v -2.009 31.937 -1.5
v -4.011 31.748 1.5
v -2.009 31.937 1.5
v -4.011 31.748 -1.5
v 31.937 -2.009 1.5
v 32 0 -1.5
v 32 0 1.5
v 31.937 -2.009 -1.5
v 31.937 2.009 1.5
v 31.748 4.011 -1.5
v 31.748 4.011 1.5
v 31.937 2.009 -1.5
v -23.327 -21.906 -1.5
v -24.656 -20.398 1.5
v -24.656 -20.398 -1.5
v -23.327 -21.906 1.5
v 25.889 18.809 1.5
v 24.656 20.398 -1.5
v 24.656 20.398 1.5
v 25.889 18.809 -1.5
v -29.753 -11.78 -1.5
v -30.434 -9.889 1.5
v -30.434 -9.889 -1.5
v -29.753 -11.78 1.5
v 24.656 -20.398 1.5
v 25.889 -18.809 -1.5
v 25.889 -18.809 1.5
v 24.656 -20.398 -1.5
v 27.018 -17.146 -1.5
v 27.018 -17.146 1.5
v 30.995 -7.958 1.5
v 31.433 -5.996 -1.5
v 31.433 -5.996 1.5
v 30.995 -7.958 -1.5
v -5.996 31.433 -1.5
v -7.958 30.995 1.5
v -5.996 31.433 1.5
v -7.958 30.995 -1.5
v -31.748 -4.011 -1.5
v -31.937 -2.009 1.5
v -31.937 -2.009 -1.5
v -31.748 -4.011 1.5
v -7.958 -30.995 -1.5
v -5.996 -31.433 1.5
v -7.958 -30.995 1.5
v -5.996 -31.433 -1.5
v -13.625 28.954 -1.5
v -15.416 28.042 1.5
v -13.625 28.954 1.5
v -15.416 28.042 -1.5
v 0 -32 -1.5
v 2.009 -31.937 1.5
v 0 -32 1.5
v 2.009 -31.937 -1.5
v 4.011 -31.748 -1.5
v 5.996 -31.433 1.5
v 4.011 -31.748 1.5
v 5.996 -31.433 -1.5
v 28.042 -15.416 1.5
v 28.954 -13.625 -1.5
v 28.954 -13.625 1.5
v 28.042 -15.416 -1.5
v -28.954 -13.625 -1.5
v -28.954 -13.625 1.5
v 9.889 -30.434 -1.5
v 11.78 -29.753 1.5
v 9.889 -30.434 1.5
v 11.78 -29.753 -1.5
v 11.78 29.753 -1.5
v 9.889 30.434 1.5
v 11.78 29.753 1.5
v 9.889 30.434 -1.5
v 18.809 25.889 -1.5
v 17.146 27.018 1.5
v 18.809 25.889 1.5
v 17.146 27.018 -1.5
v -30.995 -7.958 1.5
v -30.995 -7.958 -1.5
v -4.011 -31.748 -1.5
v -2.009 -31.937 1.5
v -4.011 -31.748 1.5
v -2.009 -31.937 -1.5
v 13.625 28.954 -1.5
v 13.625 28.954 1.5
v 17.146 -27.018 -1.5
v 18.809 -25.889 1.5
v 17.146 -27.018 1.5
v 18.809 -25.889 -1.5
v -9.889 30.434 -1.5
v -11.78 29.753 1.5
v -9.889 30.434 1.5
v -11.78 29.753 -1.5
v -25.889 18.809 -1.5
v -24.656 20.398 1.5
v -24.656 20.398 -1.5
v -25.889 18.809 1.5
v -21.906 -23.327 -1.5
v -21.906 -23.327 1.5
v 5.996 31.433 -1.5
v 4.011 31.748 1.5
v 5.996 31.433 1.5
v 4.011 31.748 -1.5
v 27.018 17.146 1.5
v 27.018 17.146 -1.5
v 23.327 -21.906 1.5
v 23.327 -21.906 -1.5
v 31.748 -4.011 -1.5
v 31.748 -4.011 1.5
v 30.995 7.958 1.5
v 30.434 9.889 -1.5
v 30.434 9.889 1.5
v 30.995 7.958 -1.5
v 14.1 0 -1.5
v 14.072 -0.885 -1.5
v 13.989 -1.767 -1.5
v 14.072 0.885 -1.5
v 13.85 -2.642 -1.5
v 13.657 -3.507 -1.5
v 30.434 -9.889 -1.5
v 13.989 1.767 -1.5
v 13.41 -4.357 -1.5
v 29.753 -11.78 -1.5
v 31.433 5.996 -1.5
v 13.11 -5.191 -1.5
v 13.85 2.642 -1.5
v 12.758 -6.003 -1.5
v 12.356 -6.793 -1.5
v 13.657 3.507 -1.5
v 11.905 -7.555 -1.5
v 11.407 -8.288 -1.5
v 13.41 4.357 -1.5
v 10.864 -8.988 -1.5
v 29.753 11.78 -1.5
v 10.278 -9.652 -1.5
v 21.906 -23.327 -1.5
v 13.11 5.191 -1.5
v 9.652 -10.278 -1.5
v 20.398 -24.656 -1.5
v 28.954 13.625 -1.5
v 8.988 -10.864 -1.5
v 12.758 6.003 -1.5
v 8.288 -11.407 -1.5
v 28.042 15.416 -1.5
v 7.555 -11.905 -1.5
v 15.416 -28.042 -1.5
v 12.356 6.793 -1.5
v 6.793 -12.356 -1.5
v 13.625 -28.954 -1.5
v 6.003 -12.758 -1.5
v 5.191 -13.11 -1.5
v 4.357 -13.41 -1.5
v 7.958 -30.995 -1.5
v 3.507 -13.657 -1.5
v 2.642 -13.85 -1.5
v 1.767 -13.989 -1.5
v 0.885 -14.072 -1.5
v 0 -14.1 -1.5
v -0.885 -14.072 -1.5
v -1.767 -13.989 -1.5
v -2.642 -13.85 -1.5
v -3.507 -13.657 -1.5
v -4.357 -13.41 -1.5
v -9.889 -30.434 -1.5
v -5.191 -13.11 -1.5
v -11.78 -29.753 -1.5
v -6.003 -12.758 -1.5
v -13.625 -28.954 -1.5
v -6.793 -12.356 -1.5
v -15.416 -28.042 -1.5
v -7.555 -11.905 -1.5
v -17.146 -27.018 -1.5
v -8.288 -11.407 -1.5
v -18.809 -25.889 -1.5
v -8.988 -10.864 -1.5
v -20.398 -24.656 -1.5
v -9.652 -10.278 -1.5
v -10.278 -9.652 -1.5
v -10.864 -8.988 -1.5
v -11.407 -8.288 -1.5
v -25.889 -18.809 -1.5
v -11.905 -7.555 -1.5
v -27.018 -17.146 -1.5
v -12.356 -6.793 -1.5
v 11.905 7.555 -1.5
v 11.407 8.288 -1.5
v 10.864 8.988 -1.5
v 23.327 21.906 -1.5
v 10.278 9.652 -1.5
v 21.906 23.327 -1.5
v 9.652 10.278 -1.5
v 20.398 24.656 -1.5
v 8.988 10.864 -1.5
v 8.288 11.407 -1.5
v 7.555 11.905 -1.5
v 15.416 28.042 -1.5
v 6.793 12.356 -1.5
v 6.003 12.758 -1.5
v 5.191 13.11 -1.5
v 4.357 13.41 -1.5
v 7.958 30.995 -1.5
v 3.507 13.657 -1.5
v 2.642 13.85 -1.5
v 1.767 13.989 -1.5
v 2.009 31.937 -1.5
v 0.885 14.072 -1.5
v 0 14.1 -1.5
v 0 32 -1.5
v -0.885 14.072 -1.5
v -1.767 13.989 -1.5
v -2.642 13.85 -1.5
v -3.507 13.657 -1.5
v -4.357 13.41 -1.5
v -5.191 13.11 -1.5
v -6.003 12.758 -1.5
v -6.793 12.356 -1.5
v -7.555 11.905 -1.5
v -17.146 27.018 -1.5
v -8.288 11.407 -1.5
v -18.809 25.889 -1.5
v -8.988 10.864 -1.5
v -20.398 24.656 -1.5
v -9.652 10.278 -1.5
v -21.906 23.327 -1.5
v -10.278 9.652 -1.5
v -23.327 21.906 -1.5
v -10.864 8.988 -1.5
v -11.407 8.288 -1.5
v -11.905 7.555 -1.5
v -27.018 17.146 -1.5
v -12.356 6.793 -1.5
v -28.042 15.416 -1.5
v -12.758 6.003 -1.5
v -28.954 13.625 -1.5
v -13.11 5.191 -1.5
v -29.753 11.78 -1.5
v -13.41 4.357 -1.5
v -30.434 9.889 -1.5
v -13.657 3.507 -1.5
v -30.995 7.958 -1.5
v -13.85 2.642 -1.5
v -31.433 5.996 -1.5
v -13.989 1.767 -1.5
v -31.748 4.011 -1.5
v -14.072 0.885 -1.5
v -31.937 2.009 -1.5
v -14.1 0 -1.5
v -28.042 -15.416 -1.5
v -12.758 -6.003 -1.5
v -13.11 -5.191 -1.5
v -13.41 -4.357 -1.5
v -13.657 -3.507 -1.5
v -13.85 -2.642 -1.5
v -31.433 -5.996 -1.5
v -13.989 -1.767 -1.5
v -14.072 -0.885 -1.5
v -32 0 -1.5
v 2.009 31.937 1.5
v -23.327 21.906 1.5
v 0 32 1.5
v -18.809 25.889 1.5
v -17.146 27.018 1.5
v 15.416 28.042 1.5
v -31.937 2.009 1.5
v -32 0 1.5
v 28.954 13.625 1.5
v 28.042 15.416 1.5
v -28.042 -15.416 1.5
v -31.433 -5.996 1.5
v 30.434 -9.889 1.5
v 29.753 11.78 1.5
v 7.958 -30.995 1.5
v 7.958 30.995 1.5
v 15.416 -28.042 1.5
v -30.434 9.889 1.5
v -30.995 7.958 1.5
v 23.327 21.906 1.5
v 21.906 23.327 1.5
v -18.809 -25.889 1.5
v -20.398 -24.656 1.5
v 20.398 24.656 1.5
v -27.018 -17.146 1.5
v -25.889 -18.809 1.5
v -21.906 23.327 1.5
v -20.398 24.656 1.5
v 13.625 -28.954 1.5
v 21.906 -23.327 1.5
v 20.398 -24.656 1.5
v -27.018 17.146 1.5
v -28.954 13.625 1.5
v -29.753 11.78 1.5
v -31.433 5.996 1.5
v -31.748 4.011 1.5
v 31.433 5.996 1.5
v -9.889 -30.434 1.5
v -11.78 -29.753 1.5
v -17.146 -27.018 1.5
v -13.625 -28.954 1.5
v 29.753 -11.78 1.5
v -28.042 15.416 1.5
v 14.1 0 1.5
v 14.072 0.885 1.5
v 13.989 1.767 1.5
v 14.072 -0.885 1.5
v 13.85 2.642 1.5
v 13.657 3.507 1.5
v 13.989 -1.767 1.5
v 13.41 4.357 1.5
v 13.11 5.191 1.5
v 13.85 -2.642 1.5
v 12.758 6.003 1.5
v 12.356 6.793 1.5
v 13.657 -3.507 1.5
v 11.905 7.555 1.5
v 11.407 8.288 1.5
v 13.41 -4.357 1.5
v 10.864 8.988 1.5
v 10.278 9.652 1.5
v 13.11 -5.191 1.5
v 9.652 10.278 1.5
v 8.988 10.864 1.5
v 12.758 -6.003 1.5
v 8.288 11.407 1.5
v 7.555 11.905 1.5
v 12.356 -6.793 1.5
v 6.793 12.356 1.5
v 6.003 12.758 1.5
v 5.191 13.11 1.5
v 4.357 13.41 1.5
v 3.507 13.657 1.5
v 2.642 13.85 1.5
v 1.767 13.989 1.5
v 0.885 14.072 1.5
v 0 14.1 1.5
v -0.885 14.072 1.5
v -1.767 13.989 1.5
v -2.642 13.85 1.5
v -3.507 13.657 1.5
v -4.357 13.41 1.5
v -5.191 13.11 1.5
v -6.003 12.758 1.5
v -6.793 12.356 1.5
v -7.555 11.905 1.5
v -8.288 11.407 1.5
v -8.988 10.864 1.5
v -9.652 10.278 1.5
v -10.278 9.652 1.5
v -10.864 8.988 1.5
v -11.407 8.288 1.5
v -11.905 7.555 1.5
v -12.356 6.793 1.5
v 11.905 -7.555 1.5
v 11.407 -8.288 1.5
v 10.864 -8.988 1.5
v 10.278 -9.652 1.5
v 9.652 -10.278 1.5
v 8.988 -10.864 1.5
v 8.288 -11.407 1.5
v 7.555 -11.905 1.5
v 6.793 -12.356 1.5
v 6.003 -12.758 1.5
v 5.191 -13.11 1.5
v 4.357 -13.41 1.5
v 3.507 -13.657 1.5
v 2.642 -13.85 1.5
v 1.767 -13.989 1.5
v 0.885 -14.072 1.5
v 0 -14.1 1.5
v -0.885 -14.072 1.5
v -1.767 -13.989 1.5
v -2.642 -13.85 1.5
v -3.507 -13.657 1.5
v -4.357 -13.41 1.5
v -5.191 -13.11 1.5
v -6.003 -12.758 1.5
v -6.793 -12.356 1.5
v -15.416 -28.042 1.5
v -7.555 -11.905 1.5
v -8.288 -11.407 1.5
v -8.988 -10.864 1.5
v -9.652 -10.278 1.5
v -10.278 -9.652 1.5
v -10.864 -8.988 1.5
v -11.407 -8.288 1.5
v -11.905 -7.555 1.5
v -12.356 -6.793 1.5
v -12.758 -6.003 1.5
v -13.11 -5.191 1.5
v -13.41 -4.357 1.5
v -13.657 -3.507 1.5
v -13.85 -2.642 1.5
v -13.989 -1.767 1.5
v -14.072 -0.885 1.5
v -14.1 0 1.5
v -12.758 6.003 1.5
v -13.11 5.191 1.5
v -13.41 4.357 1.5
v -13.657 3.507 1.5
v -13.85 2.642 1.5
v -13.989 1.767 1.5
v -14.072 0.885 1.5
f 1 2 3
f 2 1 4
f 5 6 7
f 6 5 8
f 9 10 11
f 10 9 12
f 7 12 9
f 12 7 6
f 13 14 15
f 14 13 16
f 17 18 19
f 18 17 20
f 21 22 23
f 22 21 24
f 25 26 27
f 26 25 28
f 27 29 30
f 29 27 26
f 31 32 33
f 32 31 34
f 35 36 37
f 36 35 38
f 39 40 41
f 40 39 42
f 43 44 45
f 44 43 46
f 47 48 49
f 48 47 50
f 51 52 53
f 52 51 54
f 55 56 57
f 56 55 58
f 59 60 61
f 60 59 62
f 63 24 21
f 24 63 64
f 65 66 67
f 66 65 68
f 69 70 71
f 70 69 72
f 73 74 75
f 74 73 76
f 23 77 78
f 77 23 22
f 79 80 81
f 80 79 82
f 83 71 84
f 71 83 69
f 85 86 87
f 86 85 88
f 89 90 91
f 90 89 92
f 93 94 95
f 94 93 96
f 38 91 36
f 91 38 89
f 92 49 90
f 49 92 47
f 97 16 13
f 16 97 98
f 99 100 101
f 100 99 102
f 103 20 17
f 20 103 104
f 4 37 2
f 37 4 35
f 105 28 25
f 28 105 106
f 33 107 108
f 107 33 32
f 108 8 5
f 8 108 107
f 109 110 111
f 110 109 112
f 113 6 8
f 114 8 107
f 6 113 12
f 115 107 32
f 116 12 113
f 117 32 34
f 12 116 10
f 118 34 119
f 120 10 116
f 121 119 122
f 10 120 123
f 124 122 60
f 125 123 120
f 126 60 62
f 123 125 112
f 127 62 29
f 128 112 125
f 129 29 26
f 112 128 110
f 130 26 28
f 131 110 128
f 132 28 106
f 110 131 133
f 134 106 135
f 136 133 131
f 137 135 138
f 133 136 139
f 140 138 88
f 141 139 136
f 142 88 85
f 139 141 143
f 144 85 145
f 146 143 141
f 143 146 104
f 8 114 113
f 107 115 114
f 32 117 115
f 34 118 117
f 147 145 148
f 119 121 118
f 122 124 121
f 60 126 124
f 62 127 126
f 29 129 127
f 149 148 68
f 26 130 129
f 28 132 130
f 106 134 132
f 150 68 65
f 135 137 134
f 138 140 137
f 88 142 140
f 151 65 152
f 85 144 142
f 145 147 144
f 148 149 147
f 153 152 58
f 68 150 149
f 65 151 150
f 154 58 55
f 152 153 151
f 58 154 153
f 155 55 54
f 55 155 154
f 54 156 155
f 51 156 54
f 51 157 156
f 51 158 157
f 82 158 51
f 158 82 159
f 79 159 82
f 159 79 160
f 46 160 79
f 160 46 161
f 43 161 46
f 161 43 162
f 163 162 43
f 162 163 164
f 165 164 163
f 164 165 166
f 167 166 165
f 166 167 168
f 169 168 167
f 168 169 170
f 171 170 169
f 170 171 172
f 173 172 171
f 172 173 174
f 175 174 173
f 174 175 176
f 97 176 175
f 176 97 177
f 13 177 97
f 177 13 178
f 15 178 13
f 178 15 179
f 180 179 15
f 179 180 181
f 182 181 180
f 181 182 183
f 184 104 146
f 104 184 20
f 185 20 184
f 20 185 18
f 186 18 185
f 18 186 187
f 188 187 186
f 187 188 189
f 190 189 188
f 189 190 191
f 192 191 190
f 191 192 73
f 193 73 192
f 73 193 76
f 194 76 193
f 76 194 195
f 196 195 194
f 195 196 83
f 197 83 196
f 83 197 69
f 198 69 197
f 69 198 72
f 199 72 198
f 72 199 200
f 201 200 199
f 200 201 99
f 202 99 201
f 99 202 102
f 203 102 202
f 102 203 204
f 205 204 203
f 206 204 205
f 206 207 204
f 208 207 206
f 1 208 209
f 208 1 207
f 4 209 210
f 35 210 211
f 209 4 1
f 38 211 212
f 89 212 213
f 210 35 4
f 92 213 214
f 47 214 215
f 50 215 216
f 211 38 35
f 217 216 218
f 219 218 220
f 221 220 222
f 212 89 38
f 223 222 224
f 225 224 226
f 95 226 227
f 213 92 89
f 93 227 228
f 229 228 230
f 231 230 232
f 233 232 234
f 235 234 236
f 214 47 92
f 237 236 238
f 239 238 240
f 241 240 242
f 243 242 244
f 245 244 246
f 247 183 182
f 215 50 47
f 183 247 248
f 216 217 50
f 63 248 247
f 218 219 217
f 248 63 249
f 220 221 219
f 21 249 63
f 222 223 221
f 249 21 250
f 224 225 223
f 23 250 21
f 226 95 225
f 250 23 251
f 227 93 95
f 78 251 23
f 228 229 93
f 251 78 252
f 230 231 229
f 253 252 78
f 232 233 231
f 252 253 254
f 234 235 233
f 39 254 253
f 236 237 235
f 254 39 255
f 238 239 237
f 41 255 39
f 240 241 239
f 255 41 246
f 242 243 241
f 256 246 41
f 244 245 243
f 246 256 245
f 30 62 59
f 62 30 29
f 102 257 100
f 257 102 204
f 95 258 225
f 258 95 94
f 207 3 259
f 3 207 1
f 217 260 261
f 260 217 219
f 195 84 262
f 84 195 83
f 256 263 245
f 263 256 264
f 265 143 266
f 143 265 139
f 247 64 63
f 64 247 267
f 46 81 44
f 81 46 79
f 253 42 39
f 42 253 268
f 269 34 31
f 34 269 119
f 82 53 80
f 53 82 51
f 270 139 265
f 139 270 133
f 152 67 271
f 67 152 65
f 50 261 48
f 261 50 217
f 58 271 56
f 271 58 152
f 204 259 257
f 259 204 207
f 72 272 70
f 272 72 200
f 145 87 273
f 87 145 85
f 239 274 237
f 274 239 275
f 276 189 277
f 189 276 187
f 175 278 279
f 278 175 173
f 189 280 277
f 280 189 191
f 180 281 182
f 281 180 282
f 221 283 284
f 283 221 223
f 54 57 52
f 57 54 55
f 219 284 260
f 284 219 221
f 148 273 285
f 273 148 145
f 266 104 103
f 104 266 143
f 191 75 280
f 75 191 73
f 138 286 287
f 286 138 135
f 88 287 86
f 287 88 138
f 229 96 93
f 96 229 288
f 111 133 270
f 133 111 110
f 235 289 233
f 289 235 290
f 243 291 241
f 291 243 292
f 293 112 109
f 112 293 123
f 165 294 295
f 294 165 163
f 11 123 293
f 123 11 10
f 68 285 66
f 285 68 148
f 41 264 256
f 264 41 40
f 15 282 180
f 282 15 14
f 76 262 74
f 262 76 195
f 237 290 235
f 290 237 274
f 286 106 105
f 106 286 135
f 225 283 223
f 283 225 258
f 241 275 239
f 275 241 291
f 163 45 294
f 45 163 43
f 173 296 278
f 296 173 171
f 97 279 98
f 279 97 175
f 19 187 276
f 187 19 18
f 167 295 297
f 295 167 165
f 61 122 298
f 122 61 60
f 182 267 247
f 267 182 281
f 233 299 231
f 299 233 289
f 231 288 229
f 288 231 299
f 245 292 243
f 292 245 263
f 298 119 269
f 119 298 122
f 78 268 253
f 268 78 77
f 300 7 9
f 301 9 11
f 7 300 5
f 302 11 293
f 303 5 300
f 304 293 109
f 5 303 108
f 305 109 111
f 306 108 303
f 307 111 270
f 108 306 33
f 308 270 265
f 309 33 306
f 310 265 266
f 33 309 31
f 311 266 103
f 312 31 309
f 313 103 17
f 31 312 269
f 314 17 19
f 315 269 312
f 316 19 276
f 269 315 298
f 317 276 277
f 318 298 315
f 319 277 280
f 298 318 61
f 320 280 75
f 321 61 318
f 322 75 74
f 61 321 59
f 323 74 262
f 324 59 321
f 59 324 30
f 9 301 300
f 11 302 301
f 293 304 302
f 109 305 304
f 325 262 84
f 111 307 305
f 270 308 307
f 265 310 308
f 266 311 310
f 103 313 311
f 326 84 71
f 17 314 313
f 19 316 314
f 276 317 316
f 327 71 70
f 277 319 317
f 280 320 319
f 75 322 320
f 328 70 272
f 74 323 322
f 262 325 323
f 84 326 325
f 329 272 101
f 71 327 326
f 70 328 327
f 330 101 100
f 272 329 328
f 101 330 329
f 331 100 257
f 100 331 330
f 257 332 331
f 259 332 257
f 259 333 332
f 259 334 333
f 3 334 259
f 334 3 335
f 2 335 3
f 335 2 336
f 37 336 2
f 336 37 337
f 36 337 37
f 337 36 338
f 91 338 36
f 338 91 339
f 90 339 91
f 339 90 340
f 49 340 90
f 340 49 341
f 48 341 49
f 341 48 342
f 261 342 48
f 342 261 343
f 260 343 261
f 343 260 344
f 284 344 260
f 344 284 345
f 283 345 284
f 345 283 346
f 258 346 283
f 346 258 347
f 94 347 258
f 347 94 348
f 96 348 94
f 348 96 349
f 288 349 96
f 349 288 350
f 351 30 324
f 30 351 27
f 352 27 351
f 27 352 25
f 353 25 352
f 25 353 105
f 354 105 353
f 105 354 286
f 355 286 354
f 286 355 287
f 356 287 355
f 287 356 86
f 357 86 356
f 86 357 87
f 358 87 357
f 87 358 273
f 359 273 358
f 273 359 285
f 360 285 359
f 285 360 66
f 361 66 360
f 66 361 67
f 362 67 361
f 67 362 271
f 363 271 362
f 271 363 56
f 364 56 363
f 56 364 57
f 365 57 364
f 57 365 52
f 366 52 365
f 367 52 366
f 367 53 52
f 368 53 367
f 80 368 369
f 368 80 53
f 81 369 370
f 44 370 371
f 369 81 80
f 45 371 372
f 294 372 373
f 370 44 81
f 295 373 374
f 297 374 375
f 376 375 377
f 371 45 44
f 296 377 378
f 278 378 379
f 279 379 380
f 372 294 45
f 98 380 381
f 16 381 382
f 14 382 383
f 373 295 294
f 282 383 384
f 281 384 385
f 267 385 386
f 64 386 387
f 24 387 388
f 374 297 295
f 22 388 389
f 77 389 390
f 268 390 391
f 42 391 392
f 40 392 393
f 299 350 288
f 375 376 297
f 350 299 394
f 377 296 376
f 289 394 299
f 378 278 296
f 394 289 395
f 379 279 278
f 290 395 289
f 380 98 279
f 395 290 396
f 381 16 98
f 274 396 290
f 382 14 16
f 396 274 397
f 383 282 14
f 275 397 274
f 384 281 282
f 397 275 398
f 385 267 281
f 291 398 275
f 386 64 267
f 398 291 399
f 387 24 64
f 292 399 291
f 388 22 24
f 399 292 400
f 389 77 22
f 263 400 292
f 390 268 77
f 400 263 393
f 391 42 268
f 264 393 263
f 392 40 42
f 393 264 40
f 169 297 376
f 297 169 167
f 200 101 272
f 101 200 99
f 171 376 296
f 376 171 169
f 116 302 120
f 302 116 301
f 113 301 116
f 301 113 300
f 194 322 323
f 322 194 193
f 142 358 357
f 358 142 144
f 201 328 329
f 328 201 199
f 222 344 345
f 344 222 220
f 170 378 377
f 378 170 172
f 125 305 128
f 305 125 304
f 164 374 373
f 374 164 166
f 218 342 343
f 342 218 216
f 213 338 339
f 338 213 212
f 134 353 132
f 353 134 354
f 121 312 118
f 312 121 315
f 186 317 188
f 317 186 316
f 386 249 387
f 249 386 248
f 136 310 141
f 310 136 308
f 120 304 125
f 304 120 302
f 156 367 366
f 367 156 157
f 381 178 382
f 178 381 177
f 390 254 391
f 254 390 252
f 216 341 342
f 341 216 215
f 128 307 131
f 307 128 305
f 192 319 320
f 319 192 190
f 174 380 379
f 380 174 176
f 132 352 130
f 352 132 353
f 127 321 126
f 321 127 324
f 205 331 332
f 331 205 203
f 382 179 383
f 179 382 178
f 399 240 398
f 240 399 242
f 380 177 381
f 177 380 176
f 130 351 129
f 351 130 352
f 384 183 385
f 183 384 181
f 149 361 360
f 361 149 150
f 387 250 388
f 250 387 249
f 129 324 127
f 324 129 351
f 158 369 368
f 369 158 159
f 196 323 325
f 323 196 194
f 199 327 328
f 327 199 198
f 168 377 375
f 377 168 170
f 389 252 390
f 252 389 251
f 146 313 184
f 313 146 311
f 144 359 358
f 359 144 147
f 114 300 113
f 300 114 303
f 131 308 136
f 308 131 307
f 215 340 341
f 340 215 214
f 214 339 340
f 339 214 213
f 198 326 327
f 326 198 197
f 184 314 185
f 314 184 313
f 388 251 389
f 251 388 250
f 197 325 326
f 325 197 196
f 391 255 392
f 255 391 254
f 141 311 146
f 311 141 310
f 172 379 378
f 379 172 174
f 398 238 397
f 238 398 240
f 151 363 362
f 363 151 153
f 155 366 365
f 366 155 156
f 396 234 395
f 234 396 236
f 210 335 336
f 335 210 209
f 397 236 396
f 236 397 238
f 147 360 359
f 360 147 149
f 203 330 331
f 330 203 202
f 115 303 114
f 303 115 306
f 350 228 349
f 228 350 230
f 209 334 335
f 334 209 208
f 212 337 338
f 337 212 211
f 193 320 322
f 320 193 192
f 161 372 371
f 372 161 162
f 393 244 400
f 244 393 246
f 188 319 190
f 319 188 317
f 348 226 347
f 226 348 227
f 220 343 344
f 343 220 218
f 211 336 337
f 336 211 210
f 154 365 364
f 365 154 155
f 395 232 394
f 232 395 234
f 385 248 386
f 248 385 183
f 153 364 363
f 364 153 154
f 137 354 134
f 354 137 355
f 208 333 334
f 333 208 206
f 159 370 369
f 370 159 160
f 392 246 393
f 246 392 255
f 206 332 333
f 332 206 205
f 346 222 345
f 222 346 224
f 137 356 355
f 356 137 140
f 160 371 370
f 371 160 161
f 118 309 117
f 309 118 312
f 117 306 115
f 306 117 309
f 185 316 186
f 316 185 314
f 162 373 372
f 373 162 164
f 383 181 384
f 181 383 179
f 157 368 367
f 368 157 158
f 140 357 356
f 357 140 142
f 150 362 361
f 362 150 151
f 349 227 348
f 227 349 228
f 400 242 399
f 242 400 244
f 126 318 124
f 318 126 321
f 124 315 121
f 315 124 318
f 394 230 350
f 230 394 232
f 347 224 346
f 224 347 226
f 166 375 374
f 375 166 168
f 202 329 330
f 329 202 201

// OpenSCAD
include <threads.scad>;

$fn = $preview ? 25 : 100;
EPSILON = 0.01;

// A simple disc to hold the glass dome pendant lights

DISC_HEIGHT = 3;
DISC_DIAMETER = 64;
DISC_HOLE_DIAMETER = 28.2;

difference() {
  cylinder(h = DISC_HEIGHT, r = DISC_DIAMETER / 2, center = true);
  cylinder(h = DISC_HEIGHT + EPSILON, r = DISC_HOLE_DIAMETER / 2,
           center = true);
}
